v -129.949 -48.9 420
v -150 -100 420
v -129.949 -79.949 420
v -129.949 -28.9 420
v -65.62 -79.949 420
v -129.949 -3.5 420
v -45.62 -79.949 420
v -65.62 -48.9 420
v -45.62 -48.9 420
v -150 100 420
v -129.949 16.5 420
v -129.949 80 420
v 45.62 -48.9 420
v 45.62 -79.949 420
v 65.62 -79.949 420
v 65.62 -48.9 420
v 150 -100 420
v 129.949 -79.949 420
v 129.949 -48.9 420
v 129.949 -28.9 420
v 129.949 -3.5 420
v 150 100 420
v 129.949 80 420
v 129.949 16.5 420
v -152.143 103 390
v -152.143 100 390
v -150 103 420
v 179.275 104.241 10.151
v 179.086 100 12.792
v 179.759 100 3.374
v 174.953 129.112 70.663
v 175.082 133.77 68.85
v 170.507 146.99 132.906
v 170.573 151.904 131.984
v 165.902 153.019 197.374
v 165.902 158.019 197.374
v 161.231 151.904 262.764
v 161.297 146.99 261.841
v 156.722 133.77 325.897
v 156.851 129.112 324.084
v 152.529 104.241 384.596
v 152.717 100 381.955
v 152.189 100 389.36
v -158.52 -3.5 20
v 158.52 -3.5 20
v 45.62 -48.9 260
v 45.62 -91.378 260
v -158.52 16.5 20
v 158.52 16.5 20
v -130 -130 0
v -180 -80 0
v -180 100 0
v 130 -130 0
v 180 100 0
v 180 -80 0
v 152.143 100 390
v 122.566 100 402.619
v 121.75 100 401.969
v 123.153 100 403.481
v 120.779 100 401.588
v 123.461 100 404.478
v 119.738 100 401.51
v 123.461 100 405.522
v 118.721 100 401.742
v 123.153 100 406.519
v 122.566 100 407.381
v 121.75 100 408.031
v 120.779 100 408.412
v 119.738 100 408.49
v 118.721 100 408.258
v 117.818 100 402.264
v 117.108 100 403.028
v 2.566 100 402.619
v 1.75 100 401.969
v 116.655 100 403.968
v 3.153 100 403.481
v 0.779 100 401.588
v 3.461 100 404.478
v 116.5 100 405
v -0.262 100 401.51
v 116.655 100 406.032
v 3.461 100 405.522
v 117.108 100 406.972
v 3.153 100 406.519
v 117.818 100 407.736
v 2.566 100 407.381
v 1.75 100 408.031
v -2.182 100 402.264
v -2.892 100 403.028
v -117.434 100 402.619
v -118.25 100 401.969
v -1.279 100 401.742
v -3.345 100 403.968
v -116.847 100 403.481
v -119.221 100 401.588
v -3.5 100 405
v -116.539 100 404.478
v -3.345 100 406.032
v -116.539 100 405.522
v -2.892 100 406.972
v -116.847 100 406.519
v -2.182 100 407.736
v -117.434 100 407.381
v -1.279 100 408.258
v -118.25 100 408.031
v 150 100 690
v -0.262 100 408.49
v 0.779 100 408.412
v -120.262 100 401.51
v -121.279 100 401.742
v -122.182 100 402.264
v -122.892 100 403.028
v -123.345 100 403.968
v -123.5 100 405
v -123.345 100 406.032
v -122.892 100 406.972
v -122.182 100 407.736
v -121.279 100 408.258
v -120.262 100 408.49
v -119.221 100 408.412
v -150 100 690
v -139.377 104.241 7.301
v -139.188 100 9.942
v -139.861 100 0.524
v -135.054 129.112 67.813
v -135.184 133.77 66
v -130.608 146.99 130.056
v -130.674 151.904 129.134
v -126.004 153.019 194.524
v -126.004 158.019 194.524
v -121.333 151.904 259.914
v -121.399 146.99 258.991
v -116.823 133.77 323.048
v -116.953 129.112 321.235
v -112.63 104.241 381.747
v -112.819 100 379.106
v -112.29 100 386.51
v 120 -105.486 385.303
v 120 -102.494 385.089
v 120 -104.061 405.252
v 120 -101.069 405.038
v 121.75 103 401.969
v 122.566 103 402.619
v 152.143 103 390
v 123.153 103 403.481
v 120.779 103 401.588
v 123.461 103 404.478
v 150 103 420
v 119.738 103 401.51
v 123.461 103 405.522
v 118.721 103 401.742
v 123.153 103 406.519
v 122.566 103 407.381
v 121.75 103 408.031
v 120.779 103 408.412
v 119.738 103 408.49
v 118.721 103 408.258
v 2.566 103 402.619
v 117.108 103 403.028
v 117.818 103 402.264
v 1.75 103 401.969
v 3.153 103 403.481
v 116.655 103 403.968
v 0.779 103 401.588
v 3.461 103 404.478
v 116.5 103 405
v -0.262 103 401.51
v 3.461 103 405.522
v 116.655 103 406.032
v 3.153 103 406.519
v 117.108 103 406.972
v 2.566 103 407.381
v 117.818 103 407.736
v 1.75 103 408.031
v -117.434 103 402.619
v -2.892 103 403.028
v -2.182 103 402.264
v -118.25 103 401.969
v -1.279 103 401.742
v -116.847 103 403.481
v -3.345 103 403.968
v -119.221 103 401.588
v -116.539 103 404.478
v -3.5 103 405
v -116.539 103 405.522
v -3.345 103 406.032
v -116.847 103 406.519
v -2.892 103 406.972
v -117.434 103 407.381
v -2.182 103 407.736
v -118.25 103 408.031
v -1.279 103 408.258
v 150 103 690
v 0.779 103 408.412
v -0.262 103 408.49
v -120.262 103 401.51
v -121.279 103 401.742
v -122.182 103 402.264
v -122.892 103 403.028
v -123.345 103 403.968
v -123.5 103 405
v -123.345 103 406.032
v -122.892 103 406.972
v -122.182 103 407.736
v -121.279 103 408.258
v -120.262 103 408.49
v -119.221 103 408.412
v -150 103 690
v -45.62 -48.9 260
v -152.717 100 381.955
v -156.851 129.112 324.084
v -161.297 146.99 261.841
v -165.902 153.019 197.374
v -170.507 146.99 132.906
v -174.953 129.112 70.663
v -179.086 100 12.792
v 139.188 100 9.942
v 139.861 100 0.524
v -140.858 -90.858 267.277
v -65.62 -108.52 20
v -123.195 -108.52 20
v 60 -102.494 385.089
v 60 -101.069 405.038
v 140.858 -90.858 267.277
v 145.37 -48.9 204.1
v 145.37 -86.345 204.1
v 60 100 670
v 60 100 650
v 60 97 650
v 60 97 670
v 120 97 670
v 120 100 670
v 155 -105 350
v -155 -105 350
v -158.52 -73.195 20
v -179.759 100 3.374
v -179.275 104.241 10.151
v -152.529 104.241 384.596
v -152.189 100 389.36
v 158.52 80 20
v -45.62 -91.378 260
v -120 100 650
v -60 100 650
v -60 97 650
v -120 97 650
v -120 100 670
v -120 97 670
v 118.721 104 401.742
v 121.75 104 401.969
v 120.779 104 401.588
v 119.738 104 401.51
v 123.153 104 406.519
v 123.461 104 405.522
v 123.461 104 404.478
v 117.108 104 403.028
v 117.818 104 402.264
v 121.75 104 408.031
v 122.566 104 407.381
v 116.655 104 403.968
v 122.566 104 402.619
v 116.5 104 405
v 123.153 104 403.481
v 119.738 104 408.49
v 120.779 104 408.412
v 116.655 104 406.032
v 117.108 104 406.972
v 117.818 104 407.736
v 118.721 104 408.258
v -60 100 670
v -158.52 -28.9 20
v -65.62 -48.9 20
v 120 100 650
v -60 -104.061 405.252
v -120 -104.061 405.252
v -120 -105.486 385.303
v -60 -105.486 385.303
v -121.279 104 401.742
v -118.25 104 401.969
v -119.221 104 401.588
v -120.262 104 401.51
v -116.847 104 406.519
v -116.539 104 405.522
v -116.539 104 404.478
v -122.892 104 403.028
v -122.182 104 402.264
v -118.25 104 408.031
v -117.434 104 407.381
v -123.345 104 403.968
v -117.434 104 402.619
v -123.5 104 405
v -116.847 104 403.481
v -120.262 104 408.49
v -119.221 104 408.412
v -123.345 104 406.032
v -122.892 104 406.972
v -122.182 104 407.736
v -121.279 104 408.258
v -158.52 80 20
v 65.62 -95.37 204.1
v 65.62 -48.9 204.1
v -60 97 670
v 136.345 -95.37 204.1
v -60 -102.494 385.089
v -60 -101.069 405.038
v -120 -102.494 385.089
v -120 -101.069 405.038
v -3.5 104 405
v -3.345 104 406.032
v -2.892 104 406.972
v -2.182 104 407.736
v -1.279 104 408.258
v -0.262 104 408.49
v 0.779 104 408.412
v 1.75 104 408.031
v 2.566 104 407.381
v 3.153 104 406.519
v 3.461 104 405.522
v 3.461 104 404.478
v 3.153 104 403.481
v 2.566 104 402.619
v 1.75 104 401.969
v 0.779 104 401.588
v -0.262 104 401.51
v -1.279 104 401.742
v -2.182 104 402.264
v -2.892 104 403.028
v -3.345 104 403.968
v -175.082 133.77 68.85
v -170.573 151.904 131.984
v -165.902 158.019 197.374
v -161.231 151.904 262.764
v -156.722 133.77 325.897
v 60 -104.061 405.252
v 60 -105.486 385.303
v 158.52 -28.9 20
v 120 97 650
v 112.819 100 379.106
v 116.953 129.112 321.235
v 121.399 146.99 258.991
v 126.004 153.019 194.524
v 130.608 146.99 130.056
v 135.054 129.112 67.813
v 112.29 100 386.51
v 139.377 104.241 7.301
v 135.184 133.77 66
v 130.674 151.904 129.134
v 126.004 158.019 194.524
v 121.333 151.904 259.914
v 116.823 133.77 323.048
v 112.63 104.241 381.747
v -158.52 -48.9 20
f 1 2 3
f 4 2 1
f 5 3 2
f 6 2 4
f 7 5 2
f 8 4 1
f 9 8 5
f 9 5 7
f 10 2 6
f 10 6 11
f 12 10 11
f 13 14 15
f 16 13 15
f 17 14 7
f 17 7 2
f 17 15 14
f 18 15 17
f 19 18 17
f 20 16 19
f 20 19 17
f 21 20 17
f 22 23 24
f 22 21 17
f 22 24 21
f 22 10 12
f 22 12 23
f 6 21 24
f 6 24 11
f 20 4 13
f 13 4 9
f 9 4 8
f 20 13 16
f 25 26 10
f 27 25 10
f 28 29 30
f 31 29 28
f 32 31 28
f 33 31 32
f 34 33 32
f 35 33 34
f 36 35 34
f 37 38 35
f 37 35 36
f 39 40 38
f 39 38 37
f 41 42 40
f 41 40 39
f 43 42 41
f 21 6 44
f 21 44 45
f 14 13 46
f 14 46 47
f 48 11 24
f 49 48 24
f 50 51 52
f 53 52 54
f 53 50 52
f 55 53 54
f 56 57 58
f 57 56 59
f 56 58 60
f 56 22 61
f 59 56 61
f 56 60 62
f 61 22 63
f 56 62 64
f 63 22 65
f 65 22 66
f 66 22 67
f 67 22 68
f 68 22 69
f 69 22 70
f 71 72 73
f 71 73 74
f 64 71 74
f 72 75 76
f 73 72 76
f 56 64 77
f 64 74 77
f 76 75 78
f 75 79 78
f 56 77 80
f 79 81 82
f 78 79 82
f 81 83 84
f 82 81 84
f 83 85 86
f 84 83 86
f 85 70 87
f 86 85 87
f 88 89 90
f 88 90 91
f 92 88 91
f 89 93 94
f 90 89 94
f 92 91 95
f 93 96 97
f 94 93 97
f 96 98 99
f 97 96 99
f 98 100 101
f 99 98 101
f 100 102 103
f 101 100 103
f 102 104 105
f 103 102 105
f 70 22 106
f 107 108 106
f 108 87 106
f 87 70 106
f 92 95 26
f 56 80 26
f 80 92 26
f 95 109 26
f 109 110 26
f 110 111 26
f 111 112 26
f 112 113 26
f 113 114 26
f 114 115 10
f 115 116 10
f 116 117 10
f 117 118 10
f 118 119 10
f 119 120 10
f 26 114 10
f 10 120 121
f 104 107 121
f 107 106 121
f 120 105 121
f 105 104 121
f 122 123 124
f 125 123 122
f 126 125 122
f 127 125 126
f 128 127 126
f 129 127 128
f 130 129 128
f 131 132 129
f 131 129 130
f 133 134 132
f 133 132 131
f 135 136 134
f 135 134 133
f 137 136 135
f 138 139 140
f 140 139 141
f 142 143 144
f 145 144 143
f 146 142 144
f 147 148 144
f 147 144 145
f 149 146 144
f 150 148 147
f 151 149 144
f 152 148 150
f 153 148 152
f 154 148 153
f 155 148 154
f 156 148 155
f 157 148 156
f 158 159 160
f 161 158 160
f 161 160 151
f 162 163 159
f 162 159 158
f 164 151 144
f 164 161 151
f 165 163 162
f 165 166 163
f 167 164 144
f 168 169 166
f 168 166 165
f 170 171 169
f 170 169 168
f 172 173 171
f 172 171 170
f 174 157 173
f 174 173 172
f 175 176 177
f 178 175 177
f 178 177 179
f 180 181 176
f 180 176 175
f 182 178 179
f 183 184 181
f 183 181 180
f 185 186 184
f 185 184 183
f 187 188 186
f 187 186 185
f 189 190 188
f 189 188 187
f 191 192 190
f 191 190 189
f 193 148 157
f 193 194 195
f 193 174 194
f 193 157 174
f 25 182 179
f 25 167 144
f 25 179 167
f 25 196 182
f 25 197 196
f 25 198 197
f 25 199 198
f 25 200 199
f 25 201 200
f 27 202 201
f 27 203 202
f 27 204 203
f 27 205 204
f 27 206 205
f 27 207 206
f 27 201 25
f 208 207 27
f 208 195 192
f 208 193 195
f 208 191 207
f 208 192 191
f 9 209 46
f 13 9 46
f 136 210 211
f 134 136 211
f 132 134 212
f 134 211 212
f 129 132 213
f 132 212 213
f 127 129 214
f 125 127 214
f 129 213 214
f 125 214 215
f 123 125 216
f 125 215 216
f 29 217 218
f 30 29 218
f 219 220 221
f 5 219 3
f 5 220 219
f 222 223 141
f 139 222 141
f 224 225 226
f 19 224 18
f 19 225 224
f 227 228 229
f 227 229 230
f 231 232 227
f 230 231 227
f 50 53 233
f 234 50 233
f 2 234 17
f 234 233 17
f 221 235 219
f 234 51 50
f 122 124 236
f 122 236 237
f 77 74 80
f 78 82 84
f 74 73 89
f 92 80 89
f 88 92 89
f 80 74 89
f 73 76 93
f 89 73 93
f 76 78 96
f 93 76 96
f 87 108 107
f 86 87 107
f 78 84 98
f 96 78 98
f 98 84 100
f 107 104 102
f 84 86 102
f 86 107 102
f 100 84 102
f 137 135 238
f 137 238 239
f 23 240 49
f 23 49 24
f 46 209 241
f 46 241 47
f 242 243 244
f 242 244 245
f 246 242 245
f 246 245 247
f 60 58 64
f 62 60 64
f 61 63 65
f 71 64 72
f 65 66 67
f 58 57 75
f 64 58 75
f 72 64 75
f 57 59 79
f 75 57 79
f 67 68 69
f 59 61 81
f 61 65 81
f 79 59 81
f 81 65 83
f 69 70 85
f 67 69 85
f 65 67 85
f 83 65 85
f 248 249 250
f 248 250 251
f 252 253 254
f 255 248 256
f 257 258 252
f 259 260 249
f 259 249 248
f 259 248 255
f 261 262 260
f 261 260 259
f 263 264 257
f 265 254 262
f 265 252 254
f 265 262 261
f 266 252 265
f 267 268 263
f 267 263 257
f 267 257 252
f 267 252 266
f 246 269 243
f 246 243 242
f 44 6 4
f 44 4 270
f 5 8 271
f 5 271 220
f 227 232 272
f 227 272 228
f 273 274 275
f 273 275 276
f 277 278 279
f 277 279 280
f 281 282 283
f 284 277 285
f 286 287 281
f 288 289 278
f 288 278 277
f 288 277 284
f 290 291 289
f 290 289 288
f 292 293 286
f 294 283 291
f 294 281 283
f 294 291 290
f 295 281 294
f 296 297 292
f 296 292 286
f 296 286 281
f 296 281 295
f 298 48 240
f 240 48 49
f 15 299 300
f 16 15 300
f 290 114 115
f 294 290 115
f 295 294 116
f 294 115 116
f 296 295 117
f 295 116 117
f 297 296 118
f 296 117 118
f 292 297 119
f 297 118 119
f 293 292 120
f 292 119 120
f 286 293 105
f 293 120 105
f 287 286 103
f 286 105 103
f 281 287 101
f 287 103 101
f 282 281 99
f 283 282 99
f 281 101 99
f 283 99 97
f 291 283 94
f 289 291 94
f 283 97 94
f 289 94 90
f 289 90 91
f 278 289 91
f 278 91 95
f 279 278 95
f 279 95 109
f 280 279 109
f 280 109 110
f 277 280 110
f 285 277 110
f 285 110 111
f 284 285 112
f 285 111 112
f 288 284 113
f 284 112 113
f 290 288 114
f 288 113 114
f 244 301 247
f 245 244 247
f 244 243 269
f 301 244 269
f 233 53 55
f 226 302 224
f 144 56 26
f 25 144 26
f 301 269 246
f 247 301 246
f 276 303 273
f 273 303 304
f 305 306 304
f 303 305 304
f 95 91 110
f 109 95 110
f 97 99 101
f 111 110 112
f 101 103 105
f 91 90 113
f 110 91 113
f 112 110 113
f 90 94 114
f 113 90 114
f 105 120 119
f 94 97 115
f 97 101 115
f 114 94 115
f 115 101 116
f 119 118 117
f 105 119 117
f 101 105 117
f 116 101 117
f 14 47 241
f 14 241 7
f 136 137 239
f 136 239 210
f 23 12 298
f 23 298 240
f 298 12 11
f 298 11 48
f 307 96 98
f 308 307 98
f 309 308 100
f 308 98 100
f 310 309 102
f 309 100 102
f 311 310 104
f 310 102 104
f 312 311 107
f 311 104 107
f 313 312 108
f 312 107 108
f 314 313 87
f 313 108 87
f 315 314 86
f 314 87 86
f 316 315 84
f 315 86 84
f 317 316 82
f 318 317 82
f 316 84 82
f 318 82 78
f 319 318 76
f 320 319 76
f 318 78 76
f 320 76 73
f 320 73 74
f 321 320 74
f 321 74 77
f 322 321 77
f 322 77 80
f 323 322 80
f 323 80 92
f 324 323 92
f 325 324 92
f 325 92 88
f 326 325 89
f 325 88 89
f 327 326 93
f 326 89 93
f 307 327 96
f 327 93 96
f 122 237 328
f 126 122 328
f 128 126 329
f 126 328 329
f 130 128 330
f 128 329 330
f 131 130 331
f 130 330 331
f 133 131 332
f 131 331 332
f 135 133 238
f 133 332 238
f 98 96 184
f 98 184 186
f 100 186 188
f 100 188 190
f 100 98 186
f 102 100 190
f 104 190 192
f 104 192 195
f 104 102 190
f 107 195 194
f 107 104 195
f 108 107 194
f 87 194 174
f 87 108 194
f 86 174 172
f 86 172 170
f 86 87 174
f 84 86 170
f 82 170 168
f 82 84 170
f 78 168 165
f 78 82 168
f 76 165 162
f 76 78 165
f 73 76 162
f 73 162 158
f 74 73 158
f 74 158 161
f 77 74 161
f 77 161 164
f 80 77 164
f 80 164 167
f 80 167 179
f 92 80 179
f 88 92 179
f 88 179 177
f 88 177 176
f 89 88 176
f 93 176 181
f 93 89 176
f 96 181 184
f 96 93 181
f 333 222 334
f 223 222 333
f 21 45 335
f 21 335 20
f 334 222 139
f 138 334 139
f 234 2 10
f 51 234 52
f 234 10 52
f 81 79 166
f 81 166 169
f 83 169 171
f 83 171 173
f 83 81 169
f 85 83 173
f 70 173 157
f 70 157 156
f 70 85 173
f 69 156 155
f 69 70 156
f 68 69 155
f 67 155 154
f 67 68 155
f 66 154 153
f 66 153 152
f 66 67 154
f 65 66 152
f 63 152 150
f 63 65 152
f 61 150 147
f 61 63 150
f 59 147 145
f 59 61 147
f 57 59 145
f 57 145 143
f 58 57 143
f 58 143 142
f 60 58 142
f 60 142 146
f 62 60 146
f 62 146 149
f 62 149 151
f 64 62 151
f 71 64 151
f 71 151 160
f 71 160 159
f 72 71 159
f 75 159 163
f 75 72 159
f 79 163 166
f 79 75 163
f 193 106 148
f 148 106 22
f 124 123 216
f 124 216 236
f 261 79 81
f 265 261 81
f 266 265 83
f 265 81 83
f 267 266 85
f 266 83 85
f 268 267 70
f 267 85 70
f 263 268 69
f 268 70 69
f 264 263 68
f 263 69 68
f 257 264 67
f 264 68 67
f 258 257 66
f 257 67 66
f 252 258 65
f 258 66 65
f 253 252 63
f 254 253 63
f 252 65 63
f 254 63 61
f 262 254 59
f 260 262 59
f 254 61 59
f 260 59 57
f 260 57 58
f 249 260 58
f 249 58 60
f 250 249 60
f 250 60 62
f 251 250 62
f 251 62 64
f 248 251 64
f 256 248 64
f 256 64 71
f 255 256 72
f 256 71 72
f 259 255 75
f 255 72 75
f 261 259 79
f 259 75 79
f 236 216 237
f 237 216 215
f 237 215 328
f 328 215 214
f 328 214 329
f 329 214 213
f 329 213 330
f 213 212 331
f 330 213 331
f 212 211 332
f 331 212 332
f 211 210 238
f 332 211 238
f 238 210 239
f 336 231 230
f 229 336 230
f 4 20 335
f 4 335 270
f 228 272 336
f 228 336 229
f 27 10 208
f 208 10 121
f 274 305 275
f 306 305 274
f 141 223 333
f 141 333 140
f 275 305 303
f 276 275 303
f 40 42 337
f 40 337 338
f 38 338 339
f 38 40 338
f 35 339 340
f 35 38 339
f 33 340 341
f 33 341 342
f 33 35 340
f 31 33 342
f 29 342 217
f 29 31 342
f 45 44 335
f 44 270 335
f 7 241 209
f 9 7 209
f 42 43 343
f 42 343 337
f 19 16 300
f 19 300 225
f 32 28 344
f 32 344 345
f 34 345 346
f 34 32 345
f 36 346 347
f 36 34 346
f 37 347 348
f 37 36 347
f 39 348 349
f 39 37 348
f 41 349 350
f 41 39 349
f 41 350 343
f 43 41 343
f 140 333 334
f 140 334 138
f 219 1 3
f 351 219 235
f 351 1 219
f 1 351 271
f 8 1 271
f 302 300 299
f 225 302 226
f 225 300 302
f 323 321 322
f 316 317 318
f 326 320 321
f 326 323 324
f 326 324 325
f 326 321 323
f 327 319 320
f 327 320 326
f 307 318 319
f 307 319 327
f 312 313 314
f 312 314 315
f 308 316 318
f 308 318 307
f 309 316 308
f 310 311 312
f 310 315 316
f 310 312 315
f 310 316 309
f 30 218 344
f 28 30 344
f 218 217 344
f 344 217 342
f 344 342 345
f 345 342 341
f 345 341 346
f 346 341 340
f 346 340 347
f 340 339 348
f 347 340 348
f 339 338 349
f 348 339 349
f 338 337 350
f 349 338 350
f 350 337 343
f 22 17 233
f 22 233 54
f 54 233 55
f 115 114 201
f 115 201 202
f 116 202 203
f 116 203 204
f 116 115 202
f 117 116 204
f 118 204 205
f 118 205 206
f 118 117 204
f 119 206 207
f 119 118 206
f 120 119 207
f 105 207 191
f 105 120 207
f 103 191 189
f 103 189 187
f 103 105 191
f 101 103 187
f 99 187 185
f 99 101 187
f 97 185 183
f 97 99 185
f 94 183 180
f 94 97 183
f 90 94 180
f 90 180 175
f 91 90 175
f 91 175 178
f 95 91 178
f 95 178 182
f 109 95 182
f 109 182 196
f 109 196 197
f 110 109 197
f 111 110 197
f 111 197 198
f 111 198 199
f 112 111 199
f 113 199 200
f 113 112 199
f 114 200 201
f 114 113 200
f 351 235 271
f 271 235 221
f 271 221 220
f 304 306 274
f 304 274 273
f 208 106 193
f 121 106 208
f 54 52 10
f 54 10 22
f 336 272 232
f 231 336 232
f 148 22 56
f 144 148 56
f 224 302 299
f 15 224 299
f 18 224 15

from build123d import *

# Parameters (mm, degrees)
F0_W      = 300
F0_H      = 200
F1_DEPTH  = 420
F3_DEPTH  = 420
F5_DEPTH  = 360
F7_DEPTH  = 230.001
F9_DEPTH  = 1000
F10_T     = -20
F11_W     = 317.0409461497
F11_H     = 20
F12_DEPTH = 400
F13_DEPTH = 25
F14_DEPTH = 25
F15_DEPTH = 400
F16_DEPTH = 400
F17_DEPTH = 25
F18_DEPTH = 25
F19_DEPTH = 184.1
F20_DEPTH = 240
F22_W     = 300
F22_H     = 200
F22_R     = 3.5
F22_H_2   = 70
F22_W_2   = 60
F22_H_3   = 20
F23_DEPTH = 3
F24_DEPTH = 3
F21_W     = 60
F21_H     = 20
F25_DEPTH = 3
F27_DEPTH = 40
F28_DEPTH = 4


# Not quite as in the source:
# - a pattern or mirror of a feature is missing from the dataset's text; its kind, count and spacing are read off the source's solid


with BuildPart() as f1:
    # F0 (on Top) → F1 (new body)
    with BuildSketch(Plane.XY):
        Rectangle(F0_W, F0_H)
    extrude(amount=F1_DEPTH)

    # F2 (on face) → F3 (join)
    with BuildSketch(Plane(origin=(0, 0, 0), x_dir=(1, 0, 0), z_dir=(0, 0, -1))):
        Polygon((-180, -100), (-150, -100), (-150, 100), (150, 100), (150, -100), (180, -100), (180, 130), (-180, 130), align=None)
    extrude(amount=-F3_DEPTH)

    # F4 (on face) → F5 (cut, through all)
    with BuildSketch(Plane.YZ.offset(180)):
        Polygon((-130, 0), (-100, 420), (-130, 420), align=None)
    extrude(amount=-F5_DEPTH, mode=Mode.SUBTRACT)

    # F6 (on face) → F7 (cut, through all)
    with BuildSketch(Plane(origin=(0, 100, 0), x_dir=(-1, 0, 0), z_dir=(0, 1, 0))):
        Polygon((-180, 0), (-150, 420), (-180, 420), align=None)
        Polygon((180, 420), (150, 420), (180, 0), align=None)
    extrude(amount=-F7_DEPTH, mode=Mode.SUBTRACT)

    # F8 (on face) → F9 (cut)
    with BuildSketch(Plane(origin=(0, 0, 0), x_dir=(1, 0, 0), z_dir=(0, 0, -1))):
        Polygon((-180, 80), (-130, 130), (-180, 130), align=None)
        Polygon((180, 130), (130, 130), (180, 80), align=None)
    extrude(amount=-F9_DEPTH, mode=Mode.SUBTRACT)

    # F10
    f10_openings = [f1.faces().sort_by_distance(p)[0] for p in [
        (0, 0, 420),
    ]]
    offset(amount=F10_T, openings=f10_openings)

    # F11 (on face) → F12 (join)
    with BuildSketch(Plane.XY.offset(20)):
        with Locations((0, 6.5)):
            Rectangle(F11_W, F11_H)
    extrude(amount=F12_DEPTH)

    # F13 (cut): a face of the model
    f13_faces = [f1.faces().sort_by_distance(p)[0] for p in [
        (-155.6803153832, -3.5, 380.2377923175),
    ]]
    extrude(f13_faces, amount=-F13_DEPTH, mode=Mode.SUBTRACT)

    # F14 (cut): a face of the model
    f14_faces = [f1.faces().sort_by_distance(p)[0] for p in [
        (155.6803153832, -3.5, 380.2377923175),
    ]]
    extrude(f14_faces, amount=-F14_DEPTH, mode=Mode.SUBTRACT)

    # F11 (on face) → F15 (join)
    with BuildSketch(Plane.XY.offset(20)):
        Polygon((158.5204730748, -28.9), (-158.5204730748, -28.9), (-158.5204730748, -48.9), (-65.6204730748, -48.9), (-45.6204730748, -48.9), (45.6204730748, -48.9), (65.6204730748, -48.9), (158.5204730748, -48.9), align=None)
    extrude(amount=F15_DEPTH)

    # F11 (on face) → F16 (join)
    with BuildSketch(Plane.XY.offset(20)):
        Polygon((-45.6204730748, -48.9), (-65.6204730748, -48.9), (-65.6204730748, -83.5204730748), (-65.6204730748, -108.5204730748), (-45.6204730748, -108.5204730748), (-45.6204730748, -83.5204730748), align=None)
        Polygon((65.6204730748, -83.5204730748), (65.6204730748, -48.9), (45.6204730748, -48.9), (45.6204730748, -83.5204730748), (45.6204730748, -108.5204730748), (65.6204730748, -108.5204730748), align=None)
    extrude(amount=F16_DEPTH)

    # F17 (cut): faces of the model
    f17_faces = [f1.faces().sort_by_distance(p)[0] for p in [
        (-155.6803153832, -48.9, 380.2377923175),
        (155.6803153832, -48.9, 380.2377923175),
    ]]
    extrude(f17_faces, amount=-F17_DEPTH, mode=Mode.SUBTRACT)

    # F18 (cut): faces of the model
    f18_faces = [f1.faces().sort_by_distance(p)[0] for p in [
        (-65.6204730748, -105.6803153832, 380.2377923175),
        (45.6204730748, -105.6803153832, 380.2377923175),
    ]]
    extrude(f18_faces, amount=-F18_DEPTH, mode=Mode.SUBTRACT)

    # F11 (on face) → F19 (join)
    with BuildSketch(Plane.XY.offset(20)):
        Polygon((158.5204730748, -73.1952556777), (158.5204730748, -48.9), (65.6204730748, -48.9), (65.6204730748, -83.5204730748), (65.6204730748, -108.5204730748), (123.1952556777, -108.5204730748), align=None)
    extrude(amount=F19_DEPTH)

    # F11 (on face) → F20 (join)
    with BuildSketch(Plane.XY.offset(20)):
        Polygon((45.6204730748, -48.9), (-45.6204730748, -48.9), (-45.6204730748, -83.5204730748), (-45.6204730748, -108.5204730748), (45.6204730748, -108.5204730748), (45.6204730748, -83.5204730748), align=None)
    extrude(amount=F20_DEPTH)


with BuildPart() as f23:
    # F22 (on face) → F23 (new body)
    with BuildSketch(Plane(origin=(0, 100, 0), x_dir=(-1, 0, 0), z_dir=(0, 1, 0))):
        with Locations((0, 520)):
            Rectangle(F22_W, F22_H)
        Polygon((-150, 420), (-152.1428571429, 390), (152.1428571429, 390), (150, 420), align=None)
        with Locations((-120, 405)):
            Circle(F22_R, mode=Mode.SUBTRACT)
        with Locations((0, 405)):
            Circle(F22_R, mode=Mode.SUBTRACT)
        with Locations((120, 405)):
            Circle(F22_R, mode=Mode.SUBTRACT)
        with Locations((0, 655)):
            Rectangle(F22_W, F22_H_2)
        with Locations((-90, 660)):
            Rectangle(F22_W_2, F22_H_3, mode=Mode.SUBTRACT)
        with Locations((90, 660)):
            Rectangle(F22_W_2, F22_H_3, mode=Mode.SUBTRACT)
        with Locations((-90, 660)):
            Rectangle(F22_W_2, F22_H_3)
        with Locations((90, 660)):
            Rectangle(F22_W_2, F22_H_3)
    extrude(amount=F23_DEPTH)


with BuildPart() as f24:
    # F22 (on face) → F24 (new body)
    with BuildSketch(Plane(origin=(0, 100, 0), x_dir=(-1, 0, 0), z_dir=(0, 1, 0))):
        with Locations((90, 660)):
            Rectangle(F22_W_2, F22_H_3)
    extrude(amount=-F24_DEPTH)


with BuildPart() as f24b:
    # F22 (on face) → F24, piece 2 (new body)
    with BuildSketch(Plane(origin=(0, 100, 0), x_dir=(-1, 0, 0), z_dir=(0, 1, 0))):
        with Locations((-90, 660)):
            Rectangle(F22_W_2, F22_H_3)
    extrude(amount=-F24_DEPTH)


with BuildPart() as f25:
    # F21 (on face) → F25 (new body)
    with BuildSketch(Plane(origin=(0, -129.3401015228, 9.2385786802), x_dir=(1, 0, 0), z_dir=(0, -0.9974586998, 0.07124705))):
        with Locations((-90, 386.8079489301)):
            Rectangle(F21_W, F21_H)
    extrude(amount=F25_DEPTH)


with BuildPart() as f25b:
    # F21 (on face) → F25, piece 2 (new body)
    with BuildSketch(Plane(origin=(0, -129.3401015228, 9.2385786802), x_dir=(1, 0, 0), z_dir=(0, -0.9974586998, 0.07124705))):
        with Locations((90, 386.8079489301)):
            Rectangle(F21_W, F21_H)
    extrude(amount=F25_DEPTH)


with BuildPart() as f27:
    # F26 (on face) → F27 (new body)
    with BuildSketch(Plane(origin=(179.0862944162, 0, 12.7918781726), x_dir=(0, 1, 0), z_dir=(0.9974586998, 0, 0.07124705))):
        with BuildLine():
            ThreePointArc((100, 370.1041340828), (153.0191995097, 185.0520670414), (100, 0))
            Line((100, 0), (100, -9.441984234))
            Line((100, -9.441984234), (104.241394541, -2.6477485431))
            ThreePointArc((104.241394541, -2.6477485431), (158.0191995097, 185.0520670414), (104.241394541, 372.7518826259))
            Line((104.241394541, 372.7518826259), (100, 377.5273796043))
            Line((100, 377.5273796043), (100, 370.1041340828))
        make_face()
    extrude(amount=-F27_DEPTH)


with BuildPart() as f27_copies_1:
    # F27_copies: instance of F27
    add(f27.part.mirror(Plane(origin=(0, 0, 0), x_dir=(0, 0, -1), z_dir=(-1, 0, 0))))


with BuildPart() as f28:
    # F22 (on face) → F28 (new body)
    with BuildSketch(Plane(origin=(0, 100, 0), x_dir=(-1, 0, 0), z_dir=(0, 1, 0))):
        with Locations((-120, 405)):
            Circle(F22_R)
    extrude(amount=F28_DEPTH)


with BuildPart() as f28b:
    # F22 (on face) → F28, piece 2 (new body)
    with BuildSketch(Plane(origin=(0, 100, 0), x_dir=(-1, 0, 0), z_dir=(0, 1, 0))):
        with Locations((0, 405)):
            Circle(F22_R)
    extrude(amount=F28_DEPTH)


with BuildPart() as f28c:
    # F22 (on face) → F28, piece 3 (new body)
    with BuildSketch(Plane(origin=(0, 100, 0), x_dir=(-1, 0, 0), z_dir=(0, 1, 0))):
        with Locations((120, 405)):
            Circle(F22_R)
    extrude(amount=F28_DEPTH)


solid = Compound([f1.part, f23.part, f24.part, f24b.part, f25.part, f25b.part, f27.part, f27_copies_1.part, f28.part, f28b.part, f28c.part])
